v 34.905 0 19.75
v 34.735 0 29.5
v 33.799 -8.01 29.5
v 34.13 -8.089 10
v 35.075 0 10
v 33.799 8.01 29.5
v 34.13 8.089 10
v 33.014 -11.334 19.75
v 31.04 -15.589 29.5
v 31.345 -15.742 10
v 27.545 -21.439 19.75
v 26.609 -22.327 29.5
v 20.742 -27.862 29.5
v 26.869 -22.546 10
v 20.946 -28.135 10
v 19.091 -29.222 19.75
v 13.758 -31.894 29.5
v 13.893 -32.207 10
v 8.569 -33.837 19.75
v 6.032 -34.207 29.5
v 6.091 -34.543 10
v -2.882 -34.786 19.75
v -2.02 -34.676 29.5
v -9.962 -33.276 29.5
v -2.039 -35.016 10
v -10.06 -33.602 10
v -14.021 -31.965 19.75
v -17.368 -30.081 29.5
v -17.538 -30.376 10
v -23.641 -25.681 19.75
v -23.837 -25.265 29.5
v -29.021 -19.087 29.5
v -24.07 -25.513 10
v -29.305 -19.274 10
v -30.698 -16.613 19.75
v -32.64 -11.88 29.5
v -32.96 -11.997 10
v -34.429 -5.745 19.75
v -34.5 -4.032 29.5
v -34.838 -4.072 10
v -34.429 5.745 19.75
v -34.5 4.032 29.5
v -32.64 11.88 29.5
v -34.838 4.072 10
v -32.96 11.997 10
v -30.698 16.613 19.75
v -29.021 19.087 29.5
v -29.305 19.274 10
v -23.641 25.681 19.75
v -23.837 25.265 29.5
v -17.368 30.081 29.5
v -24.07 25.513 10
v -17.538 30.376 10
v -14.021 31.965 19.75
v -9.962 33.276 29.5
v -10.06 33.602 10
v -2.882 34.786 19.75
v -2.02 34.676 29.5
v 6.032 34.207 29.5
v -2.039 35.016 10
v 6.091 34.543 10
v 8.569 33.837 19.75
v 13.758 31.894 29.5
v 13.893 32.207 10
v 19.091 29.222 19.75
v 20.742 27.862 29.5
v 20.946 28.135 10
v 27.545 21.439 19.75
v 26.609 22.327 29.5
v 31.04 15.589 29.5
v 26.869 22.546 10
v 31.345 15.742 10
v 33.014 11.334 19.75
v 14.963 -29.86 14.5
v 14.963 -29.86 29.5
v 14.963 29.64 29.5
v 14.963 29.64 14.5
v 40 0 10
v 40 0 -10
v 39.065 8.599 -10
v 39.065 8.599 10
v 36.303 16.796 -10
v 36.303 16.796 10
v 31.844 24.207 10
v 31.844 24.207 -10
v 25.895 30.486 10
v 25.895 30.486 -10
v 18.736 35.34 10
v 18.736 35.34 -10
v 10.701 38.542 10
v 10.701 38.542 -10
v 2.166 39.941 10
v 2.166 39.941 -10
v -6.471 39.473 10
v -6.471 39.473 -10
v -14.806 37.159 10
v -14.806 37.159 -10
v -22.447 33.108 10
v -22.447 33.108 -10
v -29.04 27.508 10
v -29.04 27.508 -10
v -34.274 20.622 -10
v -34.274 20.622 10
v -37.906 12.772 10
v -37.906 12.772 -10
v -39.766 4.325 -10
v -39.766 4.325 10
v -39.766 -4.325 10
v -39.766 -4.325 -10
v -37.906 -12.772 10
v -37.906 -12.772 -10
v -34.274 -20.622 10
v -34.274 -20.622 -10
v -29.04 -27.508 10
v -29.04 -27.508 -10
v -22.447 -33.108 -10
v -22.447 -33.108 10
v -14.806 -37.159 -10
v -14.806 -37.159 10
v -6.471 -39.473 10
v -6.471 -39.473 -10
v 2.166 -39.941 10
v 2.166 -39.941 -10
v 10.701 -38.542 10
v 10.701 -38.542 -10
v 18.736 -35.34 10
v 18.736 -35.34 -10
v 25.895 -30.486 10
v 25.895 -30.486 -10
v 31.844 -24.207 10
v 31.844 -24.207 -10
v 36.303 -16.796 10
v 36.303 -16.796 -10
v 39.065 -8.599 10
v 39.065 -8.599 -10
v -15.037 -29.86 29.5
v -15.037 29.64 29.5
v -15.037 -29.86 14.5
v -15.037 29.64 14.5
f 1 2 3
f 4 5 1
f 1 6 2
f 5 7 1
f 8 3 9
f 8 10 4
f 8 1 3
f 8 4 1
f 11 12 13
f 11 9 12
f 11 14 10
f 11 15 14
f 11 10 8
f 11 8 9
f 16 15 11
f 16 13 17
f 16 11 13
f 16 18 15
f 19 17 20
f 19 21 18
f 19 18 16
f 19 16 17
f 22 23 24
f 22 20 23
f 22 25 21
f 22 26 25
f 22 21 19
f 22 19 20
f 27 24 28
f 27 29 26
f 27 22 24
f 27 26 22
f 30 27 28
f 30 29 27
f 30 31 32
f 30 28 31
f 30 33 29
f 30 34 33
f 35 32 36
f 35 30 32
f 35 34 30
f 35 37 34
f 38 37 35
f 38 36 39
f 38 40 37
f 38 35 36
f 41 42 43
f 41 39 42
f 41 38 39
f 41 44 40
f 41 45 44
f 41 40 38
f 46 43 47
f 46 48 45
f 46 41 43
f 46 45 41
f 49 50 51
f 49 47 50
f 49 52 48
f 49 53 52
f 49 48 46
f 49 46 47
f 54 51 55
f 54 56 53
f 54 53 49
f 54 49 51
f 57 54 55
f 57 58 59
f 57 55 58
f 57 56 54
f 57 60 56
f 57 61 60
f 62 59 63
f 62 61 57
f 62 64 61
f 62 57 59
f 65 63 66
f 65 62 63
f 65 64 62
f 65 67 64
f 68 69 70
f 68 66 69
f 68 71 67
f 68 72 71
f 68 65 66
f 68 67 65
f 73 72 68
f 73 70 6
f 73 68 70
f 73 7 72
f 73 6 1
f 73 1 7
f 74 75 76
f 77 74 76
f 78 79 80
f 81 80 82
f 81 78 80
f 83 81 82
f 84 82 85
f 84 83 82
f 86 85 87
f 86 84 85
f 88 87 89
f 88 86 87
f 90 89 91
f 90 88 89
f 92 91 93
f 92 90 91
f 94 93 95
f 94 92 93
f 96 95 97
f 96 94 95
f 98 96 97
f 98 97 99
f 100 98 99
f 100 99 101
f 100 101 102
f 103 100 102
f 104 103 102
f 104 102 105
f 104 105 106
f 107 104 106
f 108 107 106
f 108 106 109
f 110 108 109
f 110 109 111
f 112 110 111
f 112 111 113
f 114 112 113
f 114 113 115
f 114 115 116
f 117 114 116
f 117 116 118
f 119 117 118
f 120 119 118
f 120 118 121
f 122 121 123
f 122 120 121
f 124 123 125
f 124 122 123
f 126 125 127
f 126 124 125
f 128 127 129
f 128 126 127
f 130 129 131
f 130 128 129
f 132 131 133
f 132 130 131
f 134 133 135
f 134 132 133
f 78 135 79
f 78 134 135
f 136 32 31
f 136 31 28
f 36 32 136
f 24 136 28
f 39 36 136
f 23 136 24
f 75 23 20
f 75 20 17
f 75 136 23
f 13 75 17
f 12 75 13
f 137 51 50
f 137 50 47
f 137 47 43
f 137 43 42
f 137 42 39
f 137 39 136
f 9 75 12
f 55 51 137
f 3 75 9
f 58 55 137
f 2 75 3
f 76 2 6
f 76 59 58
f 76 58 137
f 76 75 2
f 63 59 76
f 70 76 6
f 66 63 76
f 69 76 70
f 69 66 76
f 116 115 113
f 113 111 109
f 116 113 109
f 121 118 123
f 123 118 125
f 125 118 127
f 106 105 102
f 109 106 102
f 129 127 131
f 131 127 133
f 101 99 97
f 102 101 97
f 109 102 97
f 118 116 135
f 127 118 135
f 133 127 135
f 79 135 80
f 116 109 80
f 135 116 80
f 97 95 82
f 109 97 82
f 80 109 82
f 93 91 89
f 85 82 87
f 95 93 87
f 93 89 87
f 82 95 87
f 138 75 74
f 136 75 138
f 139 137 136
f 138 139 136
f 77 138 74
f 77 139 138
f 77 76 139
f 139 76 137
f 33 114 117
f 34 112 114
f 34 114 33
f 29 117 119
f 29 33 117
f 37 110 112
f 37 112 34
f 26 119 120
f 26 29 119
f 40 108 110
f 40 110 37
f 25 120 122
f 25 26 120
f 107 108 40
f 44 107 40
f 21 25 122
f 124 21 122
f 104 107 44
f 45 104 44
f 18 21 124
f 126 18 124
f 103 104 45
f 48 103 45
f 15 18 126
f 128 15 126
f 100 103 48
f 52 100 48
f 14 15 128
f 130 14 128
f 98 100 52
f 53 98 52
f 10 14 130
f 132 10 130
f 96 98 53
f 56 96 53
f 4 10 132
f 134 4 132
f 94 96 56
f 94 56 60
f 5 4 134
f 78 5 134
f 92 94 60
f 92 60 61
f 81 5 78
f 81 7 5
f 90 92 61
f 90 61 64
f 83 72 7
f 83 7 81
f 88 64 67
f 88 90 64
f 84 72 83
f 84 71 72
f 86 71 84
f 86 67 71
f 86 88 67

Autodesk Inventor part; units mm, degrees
ref_plane "YZ Plane" through (0, 0, 0) normal (1, 0, 0) x (0, 1, 0)
ref_plane "XZ Plane" through (0, 0, 0) normal (0, 1, 0) x (-1, 0, 0)
ref_plane "XY Plane" through (0, 0, 0) normal (0, 0, 1) x (1, 0, 0)
sketch "Sketch1" plane through (0, 0, 0) normal (0, 0, 1) x (1, 0, 0)
  circle A0 centre (0, 0) radius 35.25
  circle A1 centre (0, 0) radius 40
  dimension "d0" = 70.5
  dimension "d4" = 80
extrude "Extrusion1" add sketch "Sketch1" along normal blind 29.5 contours A0
draft "FaceDraft1" angle 1 pull direction (0, 0, 1) faces at (35.144, -2.7316, 19.6667) fixed edges at (-35.25, 0, 0)
extrude "Extrusion2" add sketch "Sketch1" along normal mid plane 20 contours A0 | A1
sketch "Skizze2" plane through (0, 0, 29.5) normal (0, 0, 1) x (1, 0, 0)
  circle A0 centre (0, 0) radius 34.7351 projected
  line L0 (-21.0374, 27.6397) -> (-15.0374, 27.6397)
  line L1 (-15.0374, 27.6397) -> (-15.0374, 26.6397)
  line L2 (-15.0374, 26.6397) -> (-21.0374, 26.6397)
  line L3 (-21.0374, 26.6397) -> (-21.0374, 27.6397)
  line L4 (-15.0374, 26.6397) -> (14.9626, 26.6397)
  line L5 (14.9626, 26.6397) -> (14.9626, -29.8603)
  line L6 (14.9626, -29.8603) -> (-15.0374, -29.8603)
  line L7 (-15.0374, -29.8603) -> (-15.0374, 26.6397)
  line L8 (-15.0374, 26.6397) -> (14.9626, 26.6397)
  line L9 (14.9626, 26.6397) -> (14.9626, 29.6397)
  line L10 (14.9626, 29.6397) -> (-15.0374, 29.6397)
  line L11 (-15.0374, 29.6397) -> (-15.0374, 26.6397)
  dimension "d7" = 6
  dimension "d8" = 1
  dimension "d9" = 30
  dimension "d10" = 56.5
  dimension "d11" = 3
extrude "Extrusion3" cut sketch "Skizze2" against normal blind 15 contours L11 L10 L9 L4 L1 | L4 L5 L6 L7
properties part number "stopfen-front" material "yellow foam"
